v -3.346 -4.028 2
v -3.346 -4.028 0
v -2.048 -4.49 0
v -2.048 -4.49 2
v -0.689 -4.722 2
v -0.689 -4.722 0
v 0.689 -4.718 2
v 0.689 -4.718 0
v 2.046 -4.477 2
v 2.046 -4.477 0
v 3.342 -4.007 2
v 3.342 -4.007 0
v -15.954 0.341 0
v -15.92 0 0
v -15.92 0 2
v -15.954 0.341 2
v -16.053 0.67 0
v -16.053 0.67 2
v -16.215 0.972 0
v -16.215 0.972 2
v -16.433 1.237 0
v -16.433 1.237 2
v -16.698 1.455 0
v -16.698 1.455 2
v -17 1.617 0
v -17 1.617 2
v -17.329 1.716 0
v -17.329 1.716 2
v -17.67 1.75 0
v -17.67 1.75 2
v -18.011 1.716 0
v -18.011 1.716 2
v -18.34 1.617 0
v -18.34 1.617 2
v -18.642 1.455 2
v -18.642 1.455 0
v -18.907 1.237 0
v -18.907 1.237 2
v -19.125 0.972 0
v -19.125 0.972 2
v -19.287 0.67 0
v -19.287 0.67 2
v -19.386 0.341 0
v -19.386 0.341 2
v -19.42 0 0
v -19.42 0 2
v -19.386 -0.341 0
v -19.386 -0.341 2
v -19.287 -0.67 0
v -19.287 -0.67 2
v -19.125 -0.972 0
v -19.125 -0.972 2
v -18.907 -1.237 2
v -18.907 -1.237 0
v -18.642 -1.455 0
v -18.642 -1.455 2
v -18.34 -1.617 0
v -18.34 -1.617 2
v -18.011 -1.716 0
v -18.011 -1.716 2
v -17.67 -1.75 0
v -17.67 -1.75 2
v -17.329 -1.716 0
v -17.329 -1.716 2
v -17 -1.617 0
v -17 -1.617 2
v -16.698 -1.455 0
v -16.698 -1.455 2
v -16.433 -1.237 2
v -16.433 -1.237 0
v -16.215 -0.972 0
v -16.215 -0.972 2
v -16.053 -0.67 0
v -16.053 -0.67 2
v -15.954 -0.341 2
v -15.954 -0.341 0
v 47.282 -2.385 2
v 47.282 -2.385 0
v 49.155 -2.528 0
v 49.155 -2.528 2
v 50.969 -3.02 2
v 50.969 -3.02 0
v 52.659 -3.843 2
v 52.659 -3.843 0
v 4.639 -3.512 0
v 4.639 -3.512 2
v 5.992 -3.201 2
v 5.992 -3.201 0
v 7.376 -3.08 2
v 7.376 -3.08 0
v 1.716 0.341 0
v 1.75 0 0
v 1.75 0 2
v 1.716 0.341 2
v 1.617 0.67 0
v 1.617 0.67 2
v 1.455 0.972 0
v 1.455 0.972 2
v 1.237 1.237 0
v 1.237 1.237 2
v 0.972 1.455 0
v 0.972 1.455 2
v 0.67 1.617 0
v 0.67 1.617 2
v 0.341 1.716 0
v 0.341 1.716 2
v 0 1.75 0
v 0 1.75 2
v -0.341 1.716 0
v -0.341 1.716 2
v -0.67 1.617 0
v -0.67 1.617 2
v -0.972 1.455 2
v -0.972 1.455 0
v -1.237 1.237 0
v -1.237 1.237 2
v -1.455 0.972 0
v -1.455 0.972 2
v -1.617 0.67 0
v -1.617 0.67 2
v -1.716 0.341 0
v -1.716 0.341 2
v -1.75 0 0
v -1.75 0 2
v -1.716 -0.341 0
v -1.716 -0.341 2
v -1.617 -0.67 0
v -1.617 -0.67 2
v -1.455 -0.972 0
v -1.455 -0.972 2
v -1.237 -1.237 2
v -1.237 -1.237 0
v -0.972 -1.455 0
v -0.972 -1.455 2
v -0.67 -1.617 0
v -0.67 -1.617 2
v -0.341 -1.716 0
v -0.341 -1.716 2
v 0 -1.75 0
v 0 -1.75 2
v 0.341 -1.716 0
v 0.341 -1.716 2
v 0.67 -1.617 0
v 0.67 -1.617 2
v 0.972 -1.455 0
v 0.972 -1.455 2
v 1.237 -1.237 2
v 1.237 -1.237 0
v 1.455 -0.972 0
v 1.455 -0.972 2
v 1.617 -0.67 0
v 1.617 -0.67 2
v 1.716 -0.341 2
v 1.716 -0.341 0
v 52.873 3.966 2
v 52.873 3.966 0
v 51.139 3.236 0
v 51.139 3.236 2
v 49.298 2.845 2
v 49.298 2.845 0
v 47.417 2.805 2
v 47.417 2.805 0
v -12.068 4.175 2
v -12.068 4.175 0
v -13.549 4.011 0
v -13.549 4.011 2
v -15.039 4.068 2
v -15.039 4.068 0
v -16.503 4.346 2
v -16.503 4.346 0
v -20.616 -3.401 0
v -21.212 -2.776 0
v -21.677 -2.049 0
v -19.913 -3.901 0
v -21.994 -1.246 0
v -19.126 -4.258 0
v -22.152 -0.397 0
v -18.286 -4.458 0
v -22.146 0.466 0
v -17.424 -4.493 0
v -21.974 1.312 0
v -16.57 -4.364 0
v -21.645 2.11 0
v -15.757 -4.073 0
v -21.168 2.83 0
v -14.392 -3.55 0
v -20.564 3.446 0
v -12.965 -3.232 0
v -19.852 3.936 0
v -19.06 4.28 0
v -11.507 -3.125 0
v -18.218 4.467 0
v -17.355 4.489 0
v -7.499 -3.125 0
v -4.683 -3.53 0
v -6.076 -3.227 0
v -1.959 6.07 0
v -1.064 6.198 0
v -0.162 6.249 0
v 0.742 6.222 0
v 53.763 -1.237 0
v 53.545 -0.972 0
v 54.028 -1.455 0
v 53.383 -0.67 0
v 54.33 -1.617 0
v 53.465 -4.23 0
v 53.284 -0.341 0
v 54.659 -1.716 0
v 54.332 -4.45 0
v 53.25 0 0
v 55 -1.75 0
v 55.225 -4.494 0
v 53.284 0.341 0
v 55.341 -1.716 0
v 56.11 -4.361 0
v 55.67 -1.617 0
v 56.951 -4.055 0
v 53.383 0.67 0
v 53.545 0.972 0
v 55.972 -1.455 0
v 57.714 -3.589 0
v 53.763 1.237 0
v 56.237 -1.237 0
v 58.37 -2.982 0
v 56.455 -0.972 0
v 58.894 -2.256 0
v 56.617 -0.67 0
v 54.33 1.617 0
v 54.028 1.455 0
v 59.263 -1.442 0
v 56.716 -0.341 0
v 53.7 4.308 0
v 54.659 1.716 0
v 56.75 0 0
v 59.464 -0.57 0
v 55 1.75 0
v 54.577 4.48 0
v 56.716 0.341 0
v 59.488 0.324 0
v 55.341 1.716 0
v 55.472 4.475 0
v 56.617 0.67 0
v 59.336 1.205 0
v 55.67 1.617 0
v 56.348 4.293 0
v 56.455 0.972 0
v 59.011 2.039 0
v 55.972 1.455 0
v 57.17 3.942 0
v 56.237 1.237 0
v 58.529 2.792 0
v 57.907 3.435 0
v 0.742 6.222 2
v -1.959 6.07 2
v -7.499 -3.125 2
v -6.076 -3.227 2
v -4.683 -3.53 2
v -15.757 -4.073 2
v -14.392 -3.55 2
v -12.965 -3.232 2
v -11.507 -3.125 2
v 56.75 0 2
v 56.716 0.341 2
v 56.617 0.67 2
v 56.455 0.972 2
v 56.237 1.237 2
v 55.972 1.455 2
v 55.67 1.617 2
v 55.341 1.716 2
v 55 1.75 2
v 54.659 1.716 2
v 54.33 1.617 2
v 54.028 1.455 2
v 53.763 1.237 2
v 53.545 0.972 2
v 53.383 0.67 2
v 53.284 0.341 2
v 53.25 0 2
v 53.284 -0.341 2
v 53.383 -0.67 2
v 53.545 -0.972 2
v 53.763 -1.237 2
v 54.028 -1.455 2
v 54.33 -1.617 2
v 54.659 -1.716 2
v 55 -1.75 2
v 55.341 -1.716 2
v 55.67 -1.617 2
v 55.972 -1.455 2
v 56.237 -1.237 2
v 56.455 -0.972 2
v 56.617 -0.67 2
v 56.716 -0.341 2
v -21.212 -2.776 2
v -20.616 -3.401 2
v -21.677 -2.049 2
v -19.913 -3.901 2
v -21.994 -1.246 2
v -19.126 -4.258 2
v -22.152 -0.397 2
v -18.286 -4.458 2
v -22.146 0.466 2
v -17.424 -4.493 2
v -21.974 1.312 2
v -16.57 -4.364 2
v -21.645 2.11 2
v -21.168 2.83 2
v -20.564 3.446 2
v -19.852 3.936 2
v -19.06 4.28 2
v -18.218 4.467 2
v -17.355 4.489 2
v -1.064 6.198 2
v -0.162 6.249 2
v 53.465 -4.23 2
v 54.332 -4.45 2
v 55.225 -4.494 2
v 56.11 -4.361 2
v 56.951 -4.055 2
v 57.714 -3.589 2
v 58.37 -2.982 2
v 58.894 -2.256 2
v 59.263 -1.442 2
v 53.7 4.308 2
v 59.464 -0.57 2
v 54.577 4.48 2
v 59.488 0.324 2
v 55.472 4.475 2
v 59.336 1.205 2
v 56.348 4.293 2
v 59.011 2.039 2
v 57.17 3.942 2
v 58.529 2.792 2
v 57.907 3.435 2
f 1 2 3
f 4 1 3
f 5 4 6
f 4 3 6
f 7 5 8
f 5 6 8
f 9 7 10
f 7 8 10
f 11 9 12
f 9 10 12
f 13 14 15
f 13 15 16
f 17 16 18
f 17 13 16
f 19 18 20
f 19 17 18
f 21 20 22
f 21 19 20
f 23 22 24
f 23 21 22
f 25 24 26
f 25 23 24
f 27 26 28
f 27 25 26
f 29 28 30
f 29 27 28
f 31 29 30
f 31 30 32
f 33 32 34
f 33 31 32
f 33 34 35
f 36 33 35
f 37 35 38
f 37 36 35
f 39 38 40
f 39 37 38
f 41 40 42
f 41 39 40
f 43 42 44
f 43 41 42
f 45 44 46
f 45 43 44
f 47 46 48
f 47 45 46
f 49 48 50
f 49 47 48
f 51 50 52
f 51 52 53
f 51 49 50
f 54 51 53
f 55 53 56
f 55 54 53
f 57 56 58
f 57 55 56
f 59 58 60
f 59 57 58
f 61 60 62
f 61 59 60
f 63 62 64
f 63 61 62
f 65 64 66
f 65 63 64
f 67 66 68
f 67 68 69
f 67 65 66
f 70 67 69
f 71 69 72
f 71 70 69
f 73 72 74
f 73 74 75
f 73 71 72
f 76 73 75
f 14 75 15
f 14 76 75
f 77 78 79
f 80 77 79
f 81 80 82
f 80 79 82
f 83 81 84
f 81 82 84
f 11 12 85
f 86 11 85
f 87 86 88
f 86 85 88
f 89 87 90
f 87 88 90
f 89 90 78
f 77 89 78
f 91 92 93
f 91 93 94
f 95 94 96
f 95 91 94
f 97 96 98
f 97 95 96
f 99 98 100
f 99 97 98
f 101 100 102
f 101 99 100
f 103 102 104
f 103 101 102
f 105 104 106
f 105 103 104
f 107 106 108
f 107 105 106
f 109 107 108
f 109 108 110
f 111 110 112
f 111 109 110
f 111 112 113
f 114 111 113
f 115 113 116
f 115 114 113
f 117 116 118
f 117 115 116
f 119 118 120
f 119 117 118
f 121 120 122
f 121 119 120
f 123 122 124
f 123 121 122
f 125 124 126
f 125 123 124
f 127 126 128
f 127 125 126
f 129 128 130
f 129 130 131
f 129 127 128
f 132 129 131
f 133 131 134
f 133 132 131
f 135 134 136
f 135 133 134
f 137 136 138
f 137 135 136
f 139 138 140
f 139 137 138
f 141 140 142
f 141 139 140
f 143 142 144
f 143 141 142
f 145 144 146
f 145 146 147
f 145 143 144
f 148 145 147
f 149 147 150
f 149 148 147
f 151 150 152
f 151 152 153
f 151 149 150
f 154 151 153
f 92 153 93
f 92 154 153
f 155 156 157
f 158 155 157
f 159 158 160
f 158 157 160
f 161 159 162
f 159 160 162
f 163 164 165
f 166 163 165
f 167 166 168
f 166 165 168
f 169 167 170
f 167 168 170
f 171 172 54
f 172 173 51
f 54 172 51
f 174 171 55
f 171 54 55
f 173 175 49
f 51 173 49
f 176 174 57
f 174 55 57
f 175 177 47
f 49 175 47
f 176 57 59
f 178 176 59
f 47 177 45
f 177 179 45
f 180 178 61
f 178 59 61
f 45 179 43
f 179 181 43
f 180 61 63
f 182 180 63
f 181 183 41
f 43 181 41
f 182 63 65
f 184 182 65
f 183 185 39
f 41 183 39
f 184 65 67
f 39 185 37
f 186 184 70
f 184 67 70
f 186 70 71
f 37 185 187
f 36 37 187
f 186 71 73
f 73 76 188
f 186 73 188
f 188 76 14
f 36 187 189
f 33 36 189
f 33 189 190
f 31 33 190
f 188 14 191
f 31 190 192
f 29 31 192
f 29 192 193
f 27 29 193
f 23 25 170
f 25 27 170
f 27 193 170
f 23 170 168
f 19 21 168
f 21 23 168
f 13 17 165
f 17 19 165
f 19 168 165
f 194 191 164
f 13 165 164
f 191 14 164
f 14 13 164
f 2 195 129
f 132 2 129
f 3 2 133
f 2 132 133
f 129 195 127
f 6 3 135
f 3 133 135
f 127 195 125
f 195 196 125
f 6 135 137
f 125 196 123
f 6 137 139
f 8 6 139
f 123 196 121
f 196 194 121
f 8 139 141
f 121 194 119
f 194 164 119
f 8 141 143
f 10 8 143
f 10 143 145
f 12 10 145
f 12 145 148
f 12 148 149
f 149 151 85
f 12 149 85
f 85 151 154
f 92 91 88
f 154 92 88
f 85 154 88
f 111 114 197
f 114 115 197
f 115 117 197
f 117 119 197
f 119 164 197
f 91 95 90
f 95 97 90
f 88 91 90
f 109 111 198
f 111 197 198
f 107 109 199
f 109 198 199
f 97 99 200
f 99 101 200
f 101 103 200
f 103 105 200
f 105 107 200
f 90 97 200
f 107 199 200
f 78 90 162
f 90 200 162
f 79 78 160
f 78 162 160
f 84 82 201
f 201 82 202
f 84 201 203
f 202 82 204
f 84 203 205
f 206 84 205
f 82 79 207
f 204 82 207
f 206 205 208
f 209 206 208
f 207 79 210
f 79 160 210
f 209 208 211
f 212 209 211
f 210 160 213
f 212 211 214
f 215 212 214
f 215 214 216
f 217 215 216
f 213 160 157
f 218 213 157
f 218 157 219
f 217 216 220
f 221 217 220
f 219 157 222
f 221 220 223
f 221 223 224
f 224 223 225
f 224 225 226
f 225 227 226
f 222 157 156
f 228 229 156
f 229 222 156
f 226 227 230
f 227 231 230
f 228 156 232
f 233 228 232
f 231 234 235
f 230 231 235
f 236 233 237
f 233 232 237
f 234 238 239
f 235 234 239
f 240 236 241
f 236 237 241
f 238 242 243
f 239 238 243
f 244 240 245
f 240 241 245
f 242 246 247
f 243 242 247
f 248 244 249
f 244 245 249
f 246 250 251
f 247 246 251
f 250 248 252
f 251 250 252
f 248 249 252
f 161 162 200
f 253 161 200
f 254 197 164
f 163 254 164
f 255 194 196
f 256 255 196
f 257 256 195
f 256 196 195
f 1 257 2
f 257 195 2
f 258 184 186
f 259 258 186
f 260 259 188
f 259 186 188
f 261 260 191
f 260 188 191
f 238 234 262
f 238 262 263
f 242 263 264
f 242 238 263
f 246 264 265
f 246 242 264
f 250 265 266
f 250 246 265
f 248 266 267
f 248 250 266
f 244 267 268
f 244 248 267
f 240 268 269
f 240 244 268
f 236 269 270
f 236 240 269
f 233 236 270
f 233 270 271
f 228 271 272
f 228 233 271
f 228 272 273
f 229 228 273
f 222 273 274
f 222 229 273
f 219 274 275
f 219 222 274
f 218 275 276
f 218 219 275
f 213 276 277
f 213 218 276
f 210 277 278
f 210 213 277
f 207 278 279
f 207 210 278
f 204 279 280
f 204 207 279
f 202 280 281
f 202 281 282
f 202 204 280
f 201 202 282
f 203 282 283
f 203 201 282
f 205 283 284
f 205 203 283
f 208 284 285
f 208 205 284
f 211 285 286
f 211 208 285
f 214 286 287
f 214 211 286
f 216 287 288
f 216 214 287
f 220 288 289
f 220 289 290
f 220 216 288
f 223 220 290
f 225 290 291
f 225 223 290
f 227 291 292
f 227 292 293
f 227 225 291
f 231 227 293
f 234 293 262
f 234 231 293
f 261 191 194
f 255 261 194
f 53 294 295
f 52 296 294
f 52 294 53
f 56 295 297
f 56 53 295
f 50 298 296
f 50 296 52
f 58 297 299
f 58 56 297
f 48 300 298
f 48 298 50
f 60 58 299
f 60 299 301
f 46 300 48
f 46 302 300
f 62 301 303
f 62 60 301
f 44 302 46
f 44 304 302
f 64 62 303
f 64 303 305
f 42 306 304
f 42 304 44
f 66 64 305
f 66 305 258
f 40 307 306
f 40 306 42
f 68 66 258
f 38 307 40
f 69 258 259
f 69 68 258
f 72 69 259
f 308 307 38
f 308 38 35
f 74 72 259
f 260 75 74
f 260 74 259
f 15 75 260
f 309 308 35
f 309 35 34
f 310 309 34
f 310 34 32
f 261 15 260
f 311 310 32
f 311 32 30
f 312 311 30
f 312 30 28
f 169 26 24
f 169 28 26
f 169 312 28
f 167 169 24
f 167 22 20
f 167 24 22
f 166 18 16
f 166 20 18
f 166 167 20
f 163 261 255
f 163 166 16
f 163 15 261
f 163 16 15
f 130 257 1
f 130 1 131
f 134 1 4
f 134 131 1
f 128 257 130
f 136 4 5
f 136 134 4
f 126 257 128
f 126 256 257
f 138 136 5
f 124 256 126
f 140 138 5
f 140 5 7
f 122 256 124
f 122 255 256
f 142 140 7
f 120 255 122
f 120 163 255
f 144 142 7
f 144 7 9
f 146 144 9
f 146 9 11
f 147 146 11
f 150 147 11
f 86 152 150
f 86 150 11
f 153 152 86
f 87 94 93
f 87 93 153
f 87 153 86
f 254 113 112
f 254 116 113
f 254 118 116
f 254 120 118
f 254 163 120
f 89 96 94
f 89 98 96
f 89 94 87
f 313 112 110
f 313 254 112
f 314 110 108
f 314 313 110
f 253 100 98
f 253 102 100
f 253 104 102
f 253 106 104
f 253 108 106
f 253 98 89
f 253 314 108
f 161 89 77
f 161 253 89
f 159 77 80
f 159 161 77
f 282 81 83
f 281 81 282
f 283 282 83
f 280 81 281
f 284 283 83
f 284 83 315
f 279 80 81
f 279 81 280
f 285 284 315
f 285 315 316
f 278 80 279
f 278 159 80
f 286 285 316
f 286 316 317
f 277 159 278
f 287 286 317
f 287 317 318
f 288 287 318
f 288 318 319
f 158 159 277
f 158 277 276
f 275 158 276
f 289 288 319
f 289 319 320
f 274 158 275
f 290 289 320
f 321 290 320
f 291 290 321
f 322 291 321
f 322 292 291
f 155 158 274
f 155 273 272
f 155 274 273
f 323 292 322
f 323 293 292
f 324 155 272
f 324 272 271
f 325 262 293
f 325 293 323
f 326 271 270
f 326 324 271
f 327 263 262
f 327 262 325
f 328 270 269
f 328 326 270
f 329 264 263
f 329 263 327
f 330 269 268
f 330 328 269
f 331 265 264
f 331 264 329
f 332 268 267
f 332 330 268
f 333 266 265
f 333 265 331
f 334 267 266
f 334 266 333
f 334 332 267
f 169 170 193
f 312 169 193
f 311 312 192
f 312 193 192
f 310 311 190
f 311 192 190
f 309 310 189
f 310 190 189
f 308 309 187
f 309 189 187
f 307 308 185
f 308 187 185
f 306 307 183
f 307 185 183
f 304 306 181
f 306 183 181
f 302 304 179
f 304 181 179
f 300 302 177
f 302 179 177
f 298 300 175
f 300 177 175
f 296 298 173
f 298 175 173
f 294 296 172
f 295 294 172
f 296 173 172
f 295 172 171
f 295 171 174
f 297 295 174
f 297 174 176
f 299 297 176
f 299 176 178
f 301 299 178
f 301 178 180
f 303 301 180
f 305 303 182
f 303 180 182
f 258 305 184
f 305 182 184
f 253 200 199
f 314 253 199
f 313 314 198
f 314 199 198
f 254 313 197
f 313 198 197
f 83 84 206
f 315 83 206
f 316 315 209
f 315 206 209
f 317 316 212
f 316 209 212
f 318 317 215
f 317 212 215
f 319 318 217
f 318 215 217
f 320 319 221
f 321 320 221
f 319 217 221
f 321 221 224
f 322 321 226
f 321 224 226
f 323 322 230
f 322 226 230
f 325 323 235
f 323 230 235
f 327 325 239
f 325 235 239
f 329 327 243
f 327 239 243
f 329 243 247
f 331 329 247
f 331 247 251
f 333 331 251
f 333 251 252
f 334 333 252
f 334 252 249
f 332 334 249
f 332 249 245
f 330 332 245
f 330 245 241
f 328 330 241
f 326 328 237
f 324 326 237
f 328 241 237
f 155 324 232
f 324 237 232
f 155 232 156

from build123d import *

# Parameters (mm, degrees)
SKETCH1_R           = 1.75
BOSS_EXTRUDE1_DEPTH = 2


with BuildPart() as part:
    # Sketch1 → Boss-Extrude1 (new body)
    with BuildSketch(Plane.XY):
        with BuildLine():
            Line((-1.959177489, 6.07006951), (-12.067534954, 4.175209114))
            ThreePointArc((-12.067534954, 4.175209114), (-14.294918054, 4.01142257), (-16.503100774, 4.346072502))
            ThreePointArc((-16.503100774, 4.346072502), (-22.152448054, -0.397063522), (-15.757299357, -4.073275862))
            ThreePointArc((-15.757299357, -4.073275862), (-13.684324334, -3.364947711), (-11.506853482, -3.125))
            Line((-11.506853482, -3.125), (-7.49859406, -3.125))
            ThreePointArc((-7.49859406, -3.125), (-5.373977874, -3.353305875), (-3.34637416, -4.027798787))
            ThreePointArc((-3.34637416, -4.027798787), (0, -4.75), (3.341869686, -4.007233812))
            ThreePointArc((3.341869686, -4.007233812), (5.310275247, -3.332763669), (7.375648406, -3.080248053))
            Line((7.375648406, -3.080248053), (47.281791607, -2.38455359))
            ThreePointArc((47.281791607, -2.38455359), (50.073909506, -2.731761792), (52.658788971, -3.843010658))
            ThreePointArc((52.658788971, -3.843010658), (59.498304049, -0.123534147), (52.873235099, 3.965711923))
            ThreePointArc((52.873235099, 3.965711923), (50.227695467, 2.997245413), (47.417022258, 2.8050907))
            Line((47.417022258, 2.8050907), (0.741973806, 6.221807217))
            ThreePointArc((0.741973806, 6.221807217), (-0.613509345, 6.233299043), (-1.959177489, 6.07006951))
        make_face()
        with Locations((-17.67, 0)):
            Circle(SKETCH1_R, mode=Mode.SUBTRACT)
        Circle(SKETCH1_R, mode=Mode.SUBTRACT)
        with Locations((55, 0)):
            Circle(SKETCH1_R, mode=Mode.SUBTRACT)
    extrude(amount=BOSS_EXTRUDE1_DEPTH)


solid = part.part
